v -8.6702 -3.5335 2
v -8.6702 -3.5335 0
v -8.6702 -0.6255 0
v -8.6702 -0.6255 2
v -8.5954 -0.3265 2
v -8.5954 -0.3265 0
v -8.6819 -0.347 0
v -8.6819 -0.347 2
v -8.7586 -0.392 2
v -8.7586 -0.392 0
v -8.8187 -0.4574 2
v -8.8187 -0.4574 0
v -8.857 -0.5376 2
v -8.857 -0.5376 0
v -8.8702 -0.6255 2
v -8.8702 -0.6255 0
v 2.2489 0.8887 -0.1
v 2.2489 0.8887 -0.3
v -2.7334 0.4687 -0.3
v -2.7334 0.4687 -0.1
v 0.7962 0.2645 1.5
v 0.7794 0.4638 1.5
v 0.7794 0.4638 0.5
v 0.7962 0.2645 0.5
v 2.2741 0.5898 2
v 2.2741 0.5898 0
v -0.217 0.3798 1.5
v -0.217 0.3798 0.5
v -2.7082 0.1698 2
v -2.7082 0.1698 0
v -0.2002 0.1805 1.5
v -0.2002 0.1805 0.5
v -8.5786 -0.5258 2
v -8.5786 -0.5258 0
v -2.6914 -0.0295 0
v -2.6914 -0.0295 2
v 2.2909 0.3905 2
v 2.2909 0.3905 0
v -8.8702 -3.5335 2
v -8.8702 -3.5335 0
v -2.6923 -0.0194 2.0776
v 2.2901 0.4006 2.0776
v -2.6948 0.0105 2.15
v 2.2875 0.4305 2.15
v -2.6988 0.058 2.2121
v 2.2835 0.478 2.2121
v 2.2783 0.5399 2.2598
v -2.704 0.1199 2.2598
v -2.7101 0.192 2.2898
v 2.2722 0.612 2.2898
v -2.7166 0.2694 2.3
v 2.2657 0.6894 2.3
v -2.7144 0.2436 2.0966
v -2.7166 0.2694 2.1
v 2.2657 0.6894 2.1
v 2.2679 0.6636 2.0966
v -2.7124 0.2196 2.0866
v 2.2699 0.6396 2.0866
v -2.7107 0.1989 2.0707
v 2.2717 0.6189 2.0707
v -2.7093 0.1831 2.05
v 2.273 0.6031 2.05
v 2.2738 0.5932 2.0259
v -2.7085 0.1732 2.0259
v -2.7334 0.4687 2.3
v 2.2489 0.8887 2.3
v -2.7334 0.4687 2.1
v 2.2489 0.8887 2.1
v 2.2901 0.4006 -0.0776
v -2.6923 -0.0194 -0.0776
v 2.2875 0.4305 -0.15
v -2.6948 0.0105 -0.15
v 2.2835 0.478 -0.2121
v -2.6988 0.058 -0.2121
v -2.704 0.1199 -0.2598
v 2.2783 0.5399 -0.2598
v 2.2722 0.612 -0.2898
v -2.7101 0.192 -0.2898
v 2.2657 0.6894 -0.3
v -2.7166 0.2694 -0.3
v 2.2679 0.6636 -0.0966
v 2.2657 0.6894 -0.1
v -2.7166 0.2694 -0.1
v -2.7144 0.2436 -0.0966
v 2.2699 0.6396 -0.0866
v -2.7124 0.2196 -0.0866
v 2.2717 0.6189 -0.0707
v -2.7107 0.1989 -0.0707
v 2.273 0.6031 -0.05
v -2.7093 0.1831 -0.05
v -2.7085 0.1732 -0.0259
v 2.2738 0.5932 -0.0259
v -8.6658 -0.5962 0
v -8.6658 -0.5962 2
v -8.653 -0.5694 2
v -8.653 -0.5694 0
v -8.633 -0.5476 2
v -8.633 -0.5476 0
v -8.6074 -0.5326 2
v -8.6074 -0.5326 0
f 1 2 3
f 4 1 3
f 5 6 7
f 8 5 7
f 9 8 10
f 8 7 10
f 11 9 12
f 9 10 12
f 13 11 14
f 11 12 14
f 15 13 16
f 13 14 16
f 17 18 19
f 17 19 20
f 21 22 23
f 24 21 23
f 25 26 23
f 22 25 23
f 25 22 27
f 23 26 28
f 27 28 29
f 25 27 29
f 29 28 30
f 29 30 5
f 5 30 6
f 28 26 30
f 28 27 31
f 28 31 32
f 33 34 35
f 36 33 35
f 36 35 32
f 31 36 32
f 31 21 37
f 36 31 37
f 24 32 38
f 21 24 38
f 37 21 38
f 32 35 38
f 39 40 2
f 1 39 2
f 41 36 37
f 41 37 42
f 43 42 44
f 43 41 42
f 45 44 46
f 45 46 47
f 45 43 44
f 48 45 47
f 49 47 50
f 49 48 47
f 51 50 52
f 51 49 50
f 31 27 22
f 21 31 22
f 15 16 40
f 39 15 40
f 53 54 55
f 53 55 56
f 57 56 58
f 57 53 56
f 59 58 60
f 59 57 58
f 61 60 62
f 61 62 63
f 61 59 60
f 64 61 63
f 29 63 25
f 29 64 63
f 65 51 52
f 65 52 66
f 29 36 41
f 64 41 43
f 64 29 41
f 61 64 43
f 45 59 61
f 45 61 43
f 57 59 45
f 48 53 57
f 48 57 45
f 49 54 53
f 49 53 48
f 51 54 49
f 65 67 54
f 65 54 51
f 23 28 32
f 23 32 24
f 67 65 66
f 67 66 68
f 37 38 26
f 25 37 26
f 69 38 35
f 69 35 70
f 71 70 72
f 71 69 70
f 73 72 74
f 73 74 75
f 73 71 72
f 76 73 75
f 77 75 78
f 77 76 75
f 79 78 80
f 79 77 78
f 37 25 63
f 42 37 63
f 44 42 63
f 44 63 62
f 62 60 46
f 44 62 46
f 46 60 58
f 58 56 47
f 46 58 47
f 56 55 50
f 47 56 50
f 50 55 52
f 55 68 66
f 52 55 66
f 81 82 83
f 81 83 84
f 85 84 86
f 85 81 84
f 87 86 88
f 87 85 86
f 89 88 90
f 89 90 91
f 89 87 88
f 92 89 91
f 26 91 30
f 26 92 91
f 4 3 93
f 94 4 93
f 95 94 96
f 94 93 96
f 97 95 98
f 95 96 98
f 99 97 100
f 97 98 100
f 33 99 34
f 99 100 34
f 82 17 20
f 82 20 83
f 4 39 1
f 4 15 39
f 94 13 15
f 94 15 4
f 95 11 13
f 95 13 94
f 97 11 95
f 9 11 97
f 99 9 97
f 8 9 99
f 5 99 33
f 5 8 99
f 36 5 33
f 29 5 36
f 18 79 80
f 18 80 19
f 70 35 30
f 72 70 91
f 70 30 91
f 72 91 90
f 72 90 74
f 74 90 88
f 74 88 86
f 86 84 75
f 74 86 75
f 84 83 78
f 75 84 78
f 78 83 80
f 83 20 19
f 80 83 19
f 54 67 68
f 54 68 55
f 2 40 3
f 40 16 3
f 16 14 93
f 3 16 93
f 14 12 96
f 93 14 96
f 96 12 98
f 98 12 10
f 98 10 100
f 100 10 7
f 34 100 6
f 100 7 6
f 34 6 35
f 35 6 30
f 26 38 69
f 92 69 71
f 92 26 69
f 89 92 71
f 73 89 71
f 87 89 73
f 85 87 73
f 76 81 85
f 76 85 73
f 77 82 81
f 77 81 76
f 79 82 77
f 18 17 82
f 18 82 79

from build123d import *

# Parameters (mm, degrees)
SM_BASE_FLANGE_1_DEPTH      = 2
SM_EDGE_FLANGE_1_DEPTH      = 5
SM_EDGE_FLANGE_1_BEND_DEPTH = 5
SKETCH_16_W                 = 1
SKETCH_16_H                 = 1
CUT_EXTRUDE_3_DEPTH         = 0.3


# Sheet-metal steps are written as plain solids
with BuildPart() as part:
    # Эскиз5 → Базовая кромка1 (new body)
    with BuildSketch(Plane.XY):
        with BuildLine():
            Line((-8.670207128, -3.533537369), (-8.670207128, -0.625462256))
            ThreePointArc((-8.670207128, -0.625462256), (-8.643827777, -0.557786558), (-8.578607126, -0.52581568))
            Line((-8.578607126, -0.52581568), (2.29091619, 0.390462415))
            Line((2.29091619, 0.390462415), (2.274116194, 0.589755566))
            Line((2.274116194, 0.589755566), (-8.595407122, -0.326522529))
            ThreePointArc((-8.595407122, -0.326522529), (-8.791069074, -0.422435162), (-8.870207128, -0.625462256))
            Line((-8.870207128, -0.625462256), (-8.870207128, -3.533537369))
            Line((-8.870207128, -3.533537369), (-8.670207128, -3.533537369))
        make_face()
    extrude(amount=SM_BASE_FLANGE_1_DEPTH)

    # Ребро-кромка1 section (across the edge) → Ребро-кромка1 (add)
    with BuildSketch(Plane(origin=(-2.708212587, 0.169755664, 2.1), x_dir=(0, 0, -1), z_dir=(0.9964657562113037, 0.08399998034663243, 0))):
        with BuildLine():
            Line((-0.2, 0.1), (-0.2, 0.3))
            Line((-0.2, 0.3), (0, 0.3))
            Line((0, 0.3), (0, 0.1))
            ThreePointArc((0, 0.1), (0.029289322, 0.029289322), (0.1, 0))
            Line((0.1, 0), (0.1, -0.2))
            ThreePointArc((0.1, -0.2), (-0.112132034, -0.112132034), (-0.2, 0.1))
        make_face()
    extrude(amount=SM_EDGE_FLANGE_1_DEPTH)

    # Ребро-кромка1 section 2 (across the edge) → Ребро-кромка1 bend (add)
    with BuildSketch(Plane(origin=(2.274116194, 0.589755566, -0.1), x_dir=(0, 0, 1), z_dir=(-0.9964657562113037, -0.08399998034663243, 0))):
        with BuildLine():
            Line((-0.2, 0.1), (-0.2, 0.3))
            Line((-0.2, 0.3), (0, 0.3))
            Line((0, 0.3), (0, 0.1))
            ThreePointArc((0, 0.1), (0.029289322, 0.029289322), (0.1, 0))
            Line((0.1, 0), (0.1, -0.2))
            ThreePointArc((0.1, -0.2), (-0.112132034, -0.112132034), (-0.2, 0.1))
        make_face()
    extrude(amount=SM_EDGE_FLANGE_1_BEND_DEPTH)

    # Эскиз16 → Вырез-Вытянуть3 (cut)
    with BuildSketch(Plane(origin=(-0.033318215, 0.395243668, 0), x_dir=(0.9964657562113037, 0.08399998034663245, 0), z_dir=(-0.08399998034663245, 0.9964657562113038, 0))):
        with Locations((0.315618369, -1)):
            Rectangle(SKETCH_16_W, SKETCH_16_H)
    extrude(amount=-CUT_EXTRUDE_3_DEPTH, mode=Mode.SUBTRACT)


solid = part.part
